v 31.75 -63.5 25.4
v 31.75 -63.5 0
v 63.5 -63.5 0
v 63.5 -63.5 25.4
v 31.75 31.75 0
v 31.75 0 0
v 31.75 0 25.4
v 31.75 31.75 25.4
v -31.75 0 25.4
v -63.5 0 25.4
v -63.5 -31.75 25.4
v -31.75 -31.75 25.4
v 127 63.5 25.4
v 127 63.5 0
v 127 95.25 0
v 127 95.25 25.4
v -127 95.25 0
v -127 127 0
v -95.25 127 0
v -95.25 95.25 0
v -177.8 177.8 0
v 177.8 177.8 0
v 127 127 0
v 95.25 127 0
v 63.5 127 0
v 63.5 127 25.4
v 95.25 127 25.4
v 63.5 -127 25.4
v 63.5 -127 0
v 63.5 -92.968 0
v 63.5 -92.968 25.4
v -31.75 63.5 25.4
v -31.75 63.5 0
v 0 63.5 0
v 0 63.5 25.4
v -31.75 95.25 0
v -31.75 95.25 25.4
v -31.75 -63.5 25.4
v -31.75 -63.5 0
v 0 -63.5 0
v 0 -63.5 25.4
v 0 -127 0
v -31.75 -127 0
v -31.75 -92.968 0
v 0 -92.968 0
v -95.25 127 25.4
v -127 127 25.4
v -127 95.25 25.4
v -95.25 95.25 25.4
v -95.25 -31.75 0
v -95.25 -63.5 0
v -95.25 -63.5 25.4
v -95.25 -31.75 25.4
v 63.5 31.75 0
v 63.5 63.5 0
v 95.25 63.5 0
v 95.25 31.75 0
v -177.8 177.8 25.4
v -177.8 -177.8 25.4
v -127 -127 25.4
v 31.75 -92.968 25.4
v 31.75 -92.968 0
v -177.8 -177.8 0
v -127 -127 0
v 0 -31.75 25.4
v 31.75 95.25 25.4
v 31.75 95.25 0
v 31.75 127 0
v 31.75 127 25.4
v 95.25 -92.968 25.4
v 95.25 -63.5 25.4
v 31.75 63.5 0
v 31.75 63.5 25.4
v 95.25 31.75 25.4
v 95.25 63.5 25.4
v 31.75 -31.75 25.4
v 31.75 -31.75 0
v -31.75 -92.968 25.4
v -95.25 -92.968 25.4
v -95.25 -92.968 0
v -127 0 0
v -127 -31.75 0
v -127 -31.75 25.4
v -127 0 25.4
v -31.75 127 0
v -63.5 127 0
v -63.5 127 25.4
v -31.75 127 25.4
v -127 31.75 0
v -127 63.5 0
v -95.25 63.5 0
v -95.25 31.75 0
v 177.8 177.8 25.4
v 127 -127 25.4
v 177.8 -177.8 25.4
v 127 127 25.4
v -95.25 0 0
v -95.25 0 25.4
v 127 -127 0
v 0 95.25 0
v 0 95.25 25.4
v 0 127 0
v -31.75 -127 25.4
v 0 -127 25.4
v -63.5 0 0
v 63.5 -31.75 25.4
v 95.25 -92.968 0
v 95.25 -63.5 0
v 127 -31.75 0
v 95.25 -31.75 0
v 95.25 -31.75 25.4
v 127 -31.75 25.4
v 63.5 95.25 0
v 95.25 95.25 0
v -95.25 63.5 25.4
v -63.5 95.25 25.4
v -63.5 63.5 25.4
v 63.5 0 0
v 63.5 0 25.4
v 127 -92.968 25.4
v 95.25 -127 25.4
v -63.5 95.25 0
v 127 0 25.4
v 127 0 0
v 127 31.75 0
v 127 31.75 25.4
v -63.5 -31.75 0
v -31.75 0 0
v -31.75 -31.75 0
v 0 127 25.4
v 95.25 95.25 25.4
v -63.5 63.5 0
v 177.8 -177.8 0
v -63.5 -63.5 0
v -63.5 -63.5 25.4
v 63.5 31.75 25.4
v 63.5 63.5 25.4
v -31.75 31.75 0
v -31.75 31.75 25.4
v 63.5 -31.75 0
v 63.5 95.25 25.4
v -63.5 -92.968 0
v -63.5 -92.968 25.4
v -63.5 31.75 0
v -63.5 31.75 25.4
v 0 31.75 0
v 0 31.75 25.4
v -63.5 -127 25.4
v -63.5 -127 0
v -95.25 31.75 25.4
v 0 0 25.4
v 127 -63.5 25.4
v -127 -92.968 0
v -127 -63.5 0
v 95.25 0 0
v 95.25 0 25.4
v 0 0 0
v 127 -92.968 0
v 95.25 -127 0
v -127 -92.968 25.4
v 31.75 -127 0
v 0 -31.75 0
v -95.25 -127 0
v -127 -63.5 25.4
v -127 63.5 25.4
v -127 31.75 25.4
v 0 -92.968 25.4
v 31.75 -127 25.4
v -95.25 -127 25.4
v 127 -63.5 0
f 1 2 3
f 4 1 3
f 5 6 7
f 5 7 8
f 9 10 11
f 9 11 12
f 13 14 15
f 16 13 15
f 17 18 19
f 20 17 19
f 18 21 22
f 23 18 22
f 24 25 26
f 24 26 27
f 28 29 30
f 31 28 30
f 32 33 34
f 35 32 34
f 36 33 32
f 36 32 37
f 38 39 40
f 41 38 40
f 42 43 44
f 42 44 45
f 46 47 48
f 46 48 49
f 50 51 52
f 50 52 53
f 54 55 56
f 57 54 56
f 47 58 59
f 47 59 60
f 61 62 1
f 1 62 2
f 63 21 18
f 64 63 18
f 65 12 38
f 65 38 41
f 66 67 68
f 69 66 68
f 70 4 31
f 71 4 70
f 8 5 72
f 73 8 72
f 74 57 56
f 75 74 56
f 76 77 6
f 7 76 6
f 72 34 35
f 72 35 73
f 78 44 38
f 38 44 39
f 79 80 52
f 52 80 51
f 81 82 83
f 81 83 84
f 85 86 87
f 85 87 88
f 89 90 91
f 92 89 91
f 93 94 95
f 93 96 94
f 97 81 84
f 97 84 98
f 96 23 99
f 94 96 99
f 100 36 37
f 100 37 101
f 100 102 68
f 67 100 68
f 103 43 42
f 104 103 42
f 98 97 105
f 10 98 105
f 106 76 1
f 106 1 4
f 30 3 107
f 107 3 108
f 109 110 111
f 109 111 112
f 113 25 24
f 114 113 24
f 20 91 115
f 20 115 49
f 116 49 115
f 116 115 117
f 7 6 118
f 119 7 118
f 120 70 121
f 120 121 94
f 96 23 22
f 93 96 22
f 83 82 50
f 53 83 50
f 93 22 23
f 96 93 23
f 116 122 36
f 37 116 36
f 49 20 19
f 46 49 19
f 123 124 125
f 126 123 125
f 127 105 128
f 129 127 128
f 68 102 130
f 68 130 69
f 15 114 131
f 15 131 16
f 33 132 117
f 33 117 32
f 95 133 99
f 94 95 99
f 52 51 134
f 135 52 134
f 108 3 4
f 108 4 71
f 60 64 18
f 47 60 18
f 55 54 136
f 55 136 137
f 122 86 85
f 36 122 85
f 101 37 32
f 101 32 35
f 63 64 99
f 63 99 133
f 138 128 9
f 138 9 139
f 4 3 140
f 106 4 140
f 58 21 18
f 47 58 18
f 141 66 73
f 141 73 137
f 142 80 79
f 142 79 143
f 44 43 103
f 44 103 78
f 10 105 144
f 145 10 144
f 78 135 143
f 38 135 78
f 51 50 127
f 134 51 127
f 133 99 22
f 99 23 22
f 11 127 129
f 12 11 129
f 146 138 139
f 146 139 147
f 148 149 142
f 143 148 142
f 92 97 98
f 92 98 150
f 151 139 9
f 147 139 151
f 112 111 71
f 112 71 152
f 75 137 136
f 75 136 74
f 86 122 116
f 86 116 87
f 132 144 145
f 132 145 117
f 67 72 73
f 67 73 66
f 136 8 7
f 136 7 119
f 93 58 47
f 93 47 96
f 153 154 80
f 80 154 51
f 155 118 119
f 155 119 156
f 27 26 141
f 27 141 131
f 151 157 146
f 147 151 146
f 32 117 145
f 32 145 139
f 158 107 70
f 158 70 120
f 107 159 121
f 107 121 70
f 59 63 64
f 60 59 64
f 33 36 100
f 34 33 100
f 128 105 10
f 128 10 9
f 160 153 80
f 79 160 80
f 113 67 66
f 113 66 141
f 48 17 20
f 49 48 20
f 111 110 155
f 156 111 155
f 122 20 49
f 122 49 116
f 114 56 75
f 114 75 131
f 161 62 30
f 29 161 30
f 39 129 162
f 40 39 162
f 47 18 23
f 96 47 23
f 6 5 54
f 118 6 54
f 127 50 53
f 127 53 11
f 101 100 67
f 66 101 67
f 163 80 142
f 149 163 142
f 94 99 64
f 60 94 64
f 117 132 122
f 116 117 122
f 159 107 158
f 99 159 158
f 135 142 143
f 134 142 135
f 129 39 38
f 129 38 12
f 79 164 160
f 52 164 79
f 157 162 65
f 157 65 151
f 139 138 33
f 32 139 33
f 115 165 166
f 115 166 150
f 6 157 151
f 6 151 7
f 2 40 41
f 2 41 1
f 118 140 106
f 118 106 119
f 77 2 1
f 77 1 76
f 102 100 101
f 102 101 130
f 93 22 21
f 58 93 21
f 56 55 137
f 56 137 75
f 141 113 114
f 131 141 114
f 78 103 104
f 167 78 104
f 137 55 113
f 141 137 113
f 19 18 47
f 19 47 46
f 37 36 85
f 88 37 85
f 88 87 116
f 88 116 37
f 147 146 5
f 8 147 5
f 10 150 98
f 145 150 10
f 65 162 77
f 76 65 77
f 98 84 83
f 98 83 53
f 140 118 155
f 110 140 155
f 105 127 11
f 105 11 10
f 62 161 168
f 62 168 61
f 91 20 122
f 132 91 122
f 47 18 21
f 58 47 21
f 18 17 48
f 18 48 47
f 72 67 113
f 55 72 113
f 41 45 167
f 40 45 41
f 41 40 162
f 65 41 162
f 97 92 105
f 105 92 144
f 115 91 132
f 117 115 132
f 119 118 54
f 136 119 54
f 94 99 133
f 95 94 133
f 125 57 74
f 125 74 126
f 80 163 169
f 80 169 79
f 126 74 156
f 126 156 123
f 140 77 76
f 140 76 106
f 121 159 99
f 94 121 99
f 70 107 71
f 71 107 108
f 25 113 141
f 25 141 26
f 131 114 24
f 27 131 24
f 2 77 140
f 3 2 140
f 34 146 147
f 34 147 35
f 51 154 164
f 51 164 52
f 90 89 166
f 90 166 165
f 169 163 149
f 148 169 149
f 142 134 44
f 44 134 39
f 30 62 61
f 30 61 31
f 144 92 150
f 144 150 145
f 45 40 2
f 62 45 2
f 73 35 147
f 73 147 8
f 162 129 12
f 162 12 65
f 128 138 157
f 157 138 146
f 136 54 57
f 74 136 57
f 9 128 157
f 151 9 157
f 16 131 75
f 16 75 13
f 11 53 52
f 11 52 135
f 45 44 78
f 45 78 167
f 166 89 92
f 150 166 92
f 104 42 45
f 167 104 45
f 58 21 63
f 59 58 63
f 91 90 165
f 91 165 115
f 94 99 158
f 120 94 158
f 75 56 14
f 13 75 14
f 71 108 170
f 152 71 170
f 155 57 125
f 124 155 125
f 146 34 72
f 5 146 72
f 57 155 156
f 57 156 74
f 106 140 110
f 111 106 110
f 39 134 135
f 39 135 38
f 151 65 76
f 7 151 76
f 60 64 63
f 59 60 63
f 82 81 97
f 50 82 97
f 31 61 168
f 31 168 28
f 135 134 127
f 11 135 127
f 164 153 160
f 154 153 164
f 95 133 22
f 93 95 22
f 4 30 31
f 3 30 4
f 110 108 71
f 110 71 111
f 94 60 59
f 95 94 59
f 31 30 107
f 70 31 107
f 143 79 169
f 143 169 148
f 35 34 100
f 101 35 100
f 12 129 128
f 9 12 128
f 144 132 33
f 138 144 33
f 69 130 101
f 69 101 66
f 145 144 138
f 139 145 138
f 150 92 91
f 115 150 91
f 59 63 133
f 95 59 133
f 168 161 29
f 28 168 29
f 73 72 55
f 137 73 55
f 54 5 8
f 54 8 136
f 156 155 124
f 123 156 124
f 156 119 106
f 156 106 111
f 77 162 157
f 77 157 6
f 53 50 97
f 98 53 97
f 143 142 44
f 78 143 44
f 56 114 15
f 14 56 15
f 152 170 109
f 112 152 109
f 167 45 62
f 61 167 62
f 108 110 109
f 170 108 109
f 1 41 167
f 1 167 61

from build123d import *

# Parameters (mm, degrees)
F1_DEPTH = 25.4
F2_DEPTH = 25.4
F0_W     = 31.75
F0_H     = 31.75
F3_DEPTH = 25.4
F0_H_2   = 29.4682552814
F0_H_3   = 34.0317447186


with BuildPart() as f1:
    # F0 (on Top) → F1 (new body)
    with BuildSketch(Plane.XY):
        Polygon((177.8, 177.8), (-177.8, 177.8), (-127, 127), (-95.25, 127), (-63.5, 127), (-31.75, 127), (0, 127), (31.75, 127), (63.5, 127), (95.25, 127), (127, 127), align=None)
    extrude(amount=F1_DEPTH)


with BuildPart() as f1b:
    # F0 (on Top) → F1, piece 2 (new body)
    with BuildSketch(Plane.XY):
        Polygon((-127, -127), (-177.8, -177.8), (177.8, -177.8), (127, -127), (95.25, -127), (63.5, -127), (31.75, -127), (0, -127), (-31.75, -127), (-63.5, -127), (-95.25, -127), align=None)
    extrude(amount=F1_DEPTH)


with BuildPart() as f2:
    # F0 (on Top) → F2 (new body)
    with BuildSketch(Plane.XY):
        Polygon((-177.8, 177.8), (-177.8, -177.8), (-127, -127), (-127, -92.9682552814), (-127, -63.5), (-127, -31.75), (-127, 0), (-127, 31.75), (-127, 63.5), (-127, 95.25), (-127, 127), align=None)
    extrude(amount=F2_DEPTH)


with BuildPart() as f2b:
    # F0 (on Top) → F2, piece 2 (new body)
    with BuildSketch(Plane.XY):
        Polygon((127, -127), (177.8, -177.8), (177.8, 177.8), (127, 127), (127, 95.25), (127, 63.5), (127, 31.75), (127, 0), (127, -31.75), (127, -63.5), (127, -92.9682552814), align=None)
    extrude(amount=F2_DEPTH)


with BuildPart() as f3:
    # F0 (on Top) → F3 (new body)
    with BuildSketch(Plane.XY):
        with Locations((-111.125, 111.125)):
            Rectangle(F0_W, F0_H)
    extrude(amount=F3_DEPTH)


with BuildPart() as f3b:
    # F0 (on Top) → F3, piece 2 (new body)
    with BuildSketch(Plane.XY):
        with Locations((-47.625, 111.125)):
            Rectangle(F0_W, F0_H)
    extrude(amount=F3_DEPTH)


with BuildPart() as f3c:
    # F0 (on Top) → F3, piece 3 (new body)
    with BuildSketch(Plane.XY):
        with Locations((15.875, 111.125)):
            Rectangle(F0_W, F0_H)
    extrude(amount=F3_DEPTH)


with BuildPart() as f3d:
    # F0 (on Top) → F3, piece 4 (new body)
    with BuildSketch(Plane.XY):
        with Locations((79.375, 111.125)):
            Rectangle(F0_W, F0_H)
    extrude(amount=F3_DEPTH)


with BuildPart() as f3e:
    # F0 (on Top) → F3, piece 5 (new body)
    with BuildSketch(Plane.XY):
        with Locations((47.625, 79.375)):
            Rectangle(F0_W, F0_H)
    extrude(amount=F3_DEPTH)


with BuildPart() as f3f:
    # F0 (on Top) → F3, piece 6 (new body)
    with BuildSketch(Plane.XY):
        with Locations((-15.875, 79.375)):
            Rectangle(F0_W, F0_H)
    extrude(amount=F3_DEPTH)


with BuildPart() as f3g:
    # F0 (on Top) → F3, piece 7 (new body)
    with BuildSketch(Plane.XY):
        with Locations((-79.375, 79.375)):
            Rectangle(F0_W, F0_H)
    extrude(amount=F3_DEPTH)


with BuildPart() as f3h:
    # F0 (on Top) → F3, piece 8 (new body)
    with BuildSketch(Plane.XY):
        with Locations((-111.125, 47.625)):
            Rectangle(F0_W, F0_H)
    extrude(amount=F3_DEPTH)


with BuildPart() as f3i:
    # F0 (on Top) → F3, piece 9 (new body)
    with BuildSketch(Plane.XY):
        with Locations((-47.625, 47.625)):
            Rectangle(F0_W, F0_H)
    extrude(amount=F3_DEPTH)


with BuildPart() as f3j:
    # F0 (on Top) → F3, piece 10 (new body)
    with BuildSketch(Plane.XY):
        with Locations((15.875, 47.625)):
            Rectangle(F0_W, F0_H)
    extrude(amount=F3_DEPTH)


with BuildPart() as f3k:
    # F0 (on Top) → F3, piece 11 (new body)
    with BuildSketch(Plane.XY):
        with Locations((79.375, 47.625)):
            Rectangle(F0_W, F0_H)
    extrude(amount=F3_DEPTH)


with BuildPart() as f3l:
    # F0 (on Top) → F3, piece 12 (new body)
    with BuildSketch(Plane.XY):
        with Locations((47.625, 15.875)):
            Rectangle(F0_W, F0_H)
    extrude(amount=F3_DEPTH)


with BuildPart() as f3m:
    # F0 (on Top) → F3, piece 13 (new body)
    with BuildSketch(Plane.XY):
        with Locations((-15.875, 15.875)):
            Rectangle(F0_W, F0_H)
    extrude(amount=F3_DEPTH)


with BuildPart() as f3n:
    # F0 (on Top) → F3, piece 14 (new body)
    with BuildSketch(Plane.XY):
        with Locations((-79.375, 15.875)):
            Rectangle(F0_W, F0_H)
    extrude(amount=F3_DEPTH)


with BuildPart() as f3o:
    # F0 (on Top) → F3, piece 15 (new body)
    with BuildSketch(Plane.XY):
        with Locations((-111.125, -15.875)):
            Rectangle(F0_W, F0_H)
    extrude(amount=F3_DEPTH)


with BuildPart() as f3p:
    # F0 (on Top) → F3, piece 16 (new body)
    with BuildSketch(Plane.XY):
        with Locations((-47.625, -15.875)):
            Rectangle(F0_W, F0_H)
    extrude(amount=F3_DEPTH)


with BuildPart() as f3q:
    # F0 (on Top) → F3, piece 17 (new body)
    with BuildSketch(Plane.XY):
        with Locations((15.875, -15.875)):
            Rectangle(F0_W, F0_H)
    extrude(amount=F3_DEPTH)


with BuildPart() as f3r:
    # F0 (on Top) → F3, piece 18 (new body)
    with BuildSketch(Plane.XY):
        with Locations((79.375, -15.875)):
            Rectangle(F0_W, F0_H)
    extrude(amount=F3_DEPTH)


with BuildPart() as f3s:
    # F0 (on Top) → F3, piece 19 (new body)
    with BuildSketch(Plane.XY):
        with Locations((47.625, -47.625)):
            Rectangle(F0_W, F0_H)
    extrude(amount=F3_DEPTH)


with BuildPart() as f3t:
    # F0 (on Top) → F3, piece 20 (new body)
    with BuildSketch(Plane.XY):
        with Locations((-15.875, -47.625)):
            Rectangle(F0_W, F0_H)
    extrude(amount=F3_DEPTH)


with BuildPart() as f3u:
    # F0 (on Top) → F3, piece 21 (new body)
    with BuildSketch(Plane.XY):
        with Locations((-79.375, -47.625)):
            Rectangle(F0_W, F0_H)
    extrude(amount=F3_DEPTH)


with BuildPart() as f3v:
    # F0 (on Top) → F3, piece 22 (new body)
    with BuildSketch(Plane.XY):
        with Locations((-111.125, -78.2341276407)):
            Rectangle(F0_W, F0_H_2)
    extrude(amount=F3_DEPTH)


with BuildPart() as f3w:
    # F0 (on Top) → F3, piece 23 (new body)
    with BuildSketch(Plane.XY):
        with Locations((-47.625, -78.2341276407)):
            Rectangle(F0_W, F0_H_2)
    extrude(amount=F3_DEPTH)


with BuildPart() as f3x:
    # F0 (on Top) → F3, piece 24 (new body)
    with BuildSketch(Plane.XY):
        with Locations((15.875, -78.2341276407)):
            Rectangle(F0_W, F0_H_2)
    extrude(amount=F3_DEPTH)


with BuildPart() as f3y:
    # F0 (on Top) → F3, piece 25 (new body)
    with BuildSketch(Plane.XY):
        with Locations((79.375, -78.2341276407)):
            Rectangle(F0_W, F0_H_2)
    extrude(amount=F3_DEPTH)


with BuildPart() as f3z:
    # F0 (on Top) → F3, piece 26 (new body)
    with BuildSketch(Plane.XY):
        with Locations((47.625, -109.9841276407)):
            Rectangle(F0_W, F0_H_3)
    extrude(amount=F3_DEPTH)


with BuildPart() as f3ba:
    # F0 (on Top) → F3, piece 27 (new body)
    with BuildSketch(Plane.XY):
        with Locations((-15.875, -109.9841276407)):
            Rectangle(F0_W, F0_H_3)
    extrude(amount=F3_DEPTH)


with BuildPart() as f3bb:
    # F0 (on Top) → F3, piece 28 (new body)
    with BuildSketch(Plane.XY):
        with Locations((-79.375, -109.9841276407)):
            Rectangle(F0_W, F0_H_3)
    extrude(amount=F3_DEPTH)


with BuildPart() as f3bc:
    # F0 (on Top) → F3, piece 29 (new body)
    with BuildSketch(Plane.XY):
        with Locations((111.125, 79.375)):
            Rectangle(F0_W, F0_H)
    extrude(amount=F3_DEPTH)


with BuildPart() as f3bd:
    # F0 (on Top) → F3, piece 30 (new body)
    with BuildSketch(Plane.XY):
        with Locations((111.125, 15.875)):
            Rectangle(F0_W, F0_H)
    extrude(amount=F3_DEPTH)


with BuildPart() as f3be:
    # F0 (on Top) → F3, piece 31 (new body)
    with BuildSketch(Plane.XY):
        with Locations((111.125, -47.625)):
            Rectangle(F0_W, F0_H)
    extrude(amount=F3_DEPTH)


with BuildPart() as f3bf:
    # F0 (on Top) → F3, piece 32 (new body)
    with BuildSketch(Plane.XY):
        with Locations((111.125, -109.9841276407)):
            Rectangle(F0_W, F0_H_3)
    extrude(amount=F3_DEPTH)


solid = Compound([f1.part, f1b.part, f2.part, f2b.part, f3.part, f3b.part, f3c.part, f3d.part, f3e.part, f3f.part, f3g.part, f3h.part, f3i.part, f3j.part, f3k.part, f3l.part, f3m.part, f3n.part, f3o.part, f3p.part, f3q.part, f3r.part, f3s.part, f3t.part, f3u.part, f3v.part, f3w.part, f3x.part, f3y.part, f3z.part, f3ba.part, f3bb.part, f3bc.part, f3bd.part, f3be.part, f3bf.part])
